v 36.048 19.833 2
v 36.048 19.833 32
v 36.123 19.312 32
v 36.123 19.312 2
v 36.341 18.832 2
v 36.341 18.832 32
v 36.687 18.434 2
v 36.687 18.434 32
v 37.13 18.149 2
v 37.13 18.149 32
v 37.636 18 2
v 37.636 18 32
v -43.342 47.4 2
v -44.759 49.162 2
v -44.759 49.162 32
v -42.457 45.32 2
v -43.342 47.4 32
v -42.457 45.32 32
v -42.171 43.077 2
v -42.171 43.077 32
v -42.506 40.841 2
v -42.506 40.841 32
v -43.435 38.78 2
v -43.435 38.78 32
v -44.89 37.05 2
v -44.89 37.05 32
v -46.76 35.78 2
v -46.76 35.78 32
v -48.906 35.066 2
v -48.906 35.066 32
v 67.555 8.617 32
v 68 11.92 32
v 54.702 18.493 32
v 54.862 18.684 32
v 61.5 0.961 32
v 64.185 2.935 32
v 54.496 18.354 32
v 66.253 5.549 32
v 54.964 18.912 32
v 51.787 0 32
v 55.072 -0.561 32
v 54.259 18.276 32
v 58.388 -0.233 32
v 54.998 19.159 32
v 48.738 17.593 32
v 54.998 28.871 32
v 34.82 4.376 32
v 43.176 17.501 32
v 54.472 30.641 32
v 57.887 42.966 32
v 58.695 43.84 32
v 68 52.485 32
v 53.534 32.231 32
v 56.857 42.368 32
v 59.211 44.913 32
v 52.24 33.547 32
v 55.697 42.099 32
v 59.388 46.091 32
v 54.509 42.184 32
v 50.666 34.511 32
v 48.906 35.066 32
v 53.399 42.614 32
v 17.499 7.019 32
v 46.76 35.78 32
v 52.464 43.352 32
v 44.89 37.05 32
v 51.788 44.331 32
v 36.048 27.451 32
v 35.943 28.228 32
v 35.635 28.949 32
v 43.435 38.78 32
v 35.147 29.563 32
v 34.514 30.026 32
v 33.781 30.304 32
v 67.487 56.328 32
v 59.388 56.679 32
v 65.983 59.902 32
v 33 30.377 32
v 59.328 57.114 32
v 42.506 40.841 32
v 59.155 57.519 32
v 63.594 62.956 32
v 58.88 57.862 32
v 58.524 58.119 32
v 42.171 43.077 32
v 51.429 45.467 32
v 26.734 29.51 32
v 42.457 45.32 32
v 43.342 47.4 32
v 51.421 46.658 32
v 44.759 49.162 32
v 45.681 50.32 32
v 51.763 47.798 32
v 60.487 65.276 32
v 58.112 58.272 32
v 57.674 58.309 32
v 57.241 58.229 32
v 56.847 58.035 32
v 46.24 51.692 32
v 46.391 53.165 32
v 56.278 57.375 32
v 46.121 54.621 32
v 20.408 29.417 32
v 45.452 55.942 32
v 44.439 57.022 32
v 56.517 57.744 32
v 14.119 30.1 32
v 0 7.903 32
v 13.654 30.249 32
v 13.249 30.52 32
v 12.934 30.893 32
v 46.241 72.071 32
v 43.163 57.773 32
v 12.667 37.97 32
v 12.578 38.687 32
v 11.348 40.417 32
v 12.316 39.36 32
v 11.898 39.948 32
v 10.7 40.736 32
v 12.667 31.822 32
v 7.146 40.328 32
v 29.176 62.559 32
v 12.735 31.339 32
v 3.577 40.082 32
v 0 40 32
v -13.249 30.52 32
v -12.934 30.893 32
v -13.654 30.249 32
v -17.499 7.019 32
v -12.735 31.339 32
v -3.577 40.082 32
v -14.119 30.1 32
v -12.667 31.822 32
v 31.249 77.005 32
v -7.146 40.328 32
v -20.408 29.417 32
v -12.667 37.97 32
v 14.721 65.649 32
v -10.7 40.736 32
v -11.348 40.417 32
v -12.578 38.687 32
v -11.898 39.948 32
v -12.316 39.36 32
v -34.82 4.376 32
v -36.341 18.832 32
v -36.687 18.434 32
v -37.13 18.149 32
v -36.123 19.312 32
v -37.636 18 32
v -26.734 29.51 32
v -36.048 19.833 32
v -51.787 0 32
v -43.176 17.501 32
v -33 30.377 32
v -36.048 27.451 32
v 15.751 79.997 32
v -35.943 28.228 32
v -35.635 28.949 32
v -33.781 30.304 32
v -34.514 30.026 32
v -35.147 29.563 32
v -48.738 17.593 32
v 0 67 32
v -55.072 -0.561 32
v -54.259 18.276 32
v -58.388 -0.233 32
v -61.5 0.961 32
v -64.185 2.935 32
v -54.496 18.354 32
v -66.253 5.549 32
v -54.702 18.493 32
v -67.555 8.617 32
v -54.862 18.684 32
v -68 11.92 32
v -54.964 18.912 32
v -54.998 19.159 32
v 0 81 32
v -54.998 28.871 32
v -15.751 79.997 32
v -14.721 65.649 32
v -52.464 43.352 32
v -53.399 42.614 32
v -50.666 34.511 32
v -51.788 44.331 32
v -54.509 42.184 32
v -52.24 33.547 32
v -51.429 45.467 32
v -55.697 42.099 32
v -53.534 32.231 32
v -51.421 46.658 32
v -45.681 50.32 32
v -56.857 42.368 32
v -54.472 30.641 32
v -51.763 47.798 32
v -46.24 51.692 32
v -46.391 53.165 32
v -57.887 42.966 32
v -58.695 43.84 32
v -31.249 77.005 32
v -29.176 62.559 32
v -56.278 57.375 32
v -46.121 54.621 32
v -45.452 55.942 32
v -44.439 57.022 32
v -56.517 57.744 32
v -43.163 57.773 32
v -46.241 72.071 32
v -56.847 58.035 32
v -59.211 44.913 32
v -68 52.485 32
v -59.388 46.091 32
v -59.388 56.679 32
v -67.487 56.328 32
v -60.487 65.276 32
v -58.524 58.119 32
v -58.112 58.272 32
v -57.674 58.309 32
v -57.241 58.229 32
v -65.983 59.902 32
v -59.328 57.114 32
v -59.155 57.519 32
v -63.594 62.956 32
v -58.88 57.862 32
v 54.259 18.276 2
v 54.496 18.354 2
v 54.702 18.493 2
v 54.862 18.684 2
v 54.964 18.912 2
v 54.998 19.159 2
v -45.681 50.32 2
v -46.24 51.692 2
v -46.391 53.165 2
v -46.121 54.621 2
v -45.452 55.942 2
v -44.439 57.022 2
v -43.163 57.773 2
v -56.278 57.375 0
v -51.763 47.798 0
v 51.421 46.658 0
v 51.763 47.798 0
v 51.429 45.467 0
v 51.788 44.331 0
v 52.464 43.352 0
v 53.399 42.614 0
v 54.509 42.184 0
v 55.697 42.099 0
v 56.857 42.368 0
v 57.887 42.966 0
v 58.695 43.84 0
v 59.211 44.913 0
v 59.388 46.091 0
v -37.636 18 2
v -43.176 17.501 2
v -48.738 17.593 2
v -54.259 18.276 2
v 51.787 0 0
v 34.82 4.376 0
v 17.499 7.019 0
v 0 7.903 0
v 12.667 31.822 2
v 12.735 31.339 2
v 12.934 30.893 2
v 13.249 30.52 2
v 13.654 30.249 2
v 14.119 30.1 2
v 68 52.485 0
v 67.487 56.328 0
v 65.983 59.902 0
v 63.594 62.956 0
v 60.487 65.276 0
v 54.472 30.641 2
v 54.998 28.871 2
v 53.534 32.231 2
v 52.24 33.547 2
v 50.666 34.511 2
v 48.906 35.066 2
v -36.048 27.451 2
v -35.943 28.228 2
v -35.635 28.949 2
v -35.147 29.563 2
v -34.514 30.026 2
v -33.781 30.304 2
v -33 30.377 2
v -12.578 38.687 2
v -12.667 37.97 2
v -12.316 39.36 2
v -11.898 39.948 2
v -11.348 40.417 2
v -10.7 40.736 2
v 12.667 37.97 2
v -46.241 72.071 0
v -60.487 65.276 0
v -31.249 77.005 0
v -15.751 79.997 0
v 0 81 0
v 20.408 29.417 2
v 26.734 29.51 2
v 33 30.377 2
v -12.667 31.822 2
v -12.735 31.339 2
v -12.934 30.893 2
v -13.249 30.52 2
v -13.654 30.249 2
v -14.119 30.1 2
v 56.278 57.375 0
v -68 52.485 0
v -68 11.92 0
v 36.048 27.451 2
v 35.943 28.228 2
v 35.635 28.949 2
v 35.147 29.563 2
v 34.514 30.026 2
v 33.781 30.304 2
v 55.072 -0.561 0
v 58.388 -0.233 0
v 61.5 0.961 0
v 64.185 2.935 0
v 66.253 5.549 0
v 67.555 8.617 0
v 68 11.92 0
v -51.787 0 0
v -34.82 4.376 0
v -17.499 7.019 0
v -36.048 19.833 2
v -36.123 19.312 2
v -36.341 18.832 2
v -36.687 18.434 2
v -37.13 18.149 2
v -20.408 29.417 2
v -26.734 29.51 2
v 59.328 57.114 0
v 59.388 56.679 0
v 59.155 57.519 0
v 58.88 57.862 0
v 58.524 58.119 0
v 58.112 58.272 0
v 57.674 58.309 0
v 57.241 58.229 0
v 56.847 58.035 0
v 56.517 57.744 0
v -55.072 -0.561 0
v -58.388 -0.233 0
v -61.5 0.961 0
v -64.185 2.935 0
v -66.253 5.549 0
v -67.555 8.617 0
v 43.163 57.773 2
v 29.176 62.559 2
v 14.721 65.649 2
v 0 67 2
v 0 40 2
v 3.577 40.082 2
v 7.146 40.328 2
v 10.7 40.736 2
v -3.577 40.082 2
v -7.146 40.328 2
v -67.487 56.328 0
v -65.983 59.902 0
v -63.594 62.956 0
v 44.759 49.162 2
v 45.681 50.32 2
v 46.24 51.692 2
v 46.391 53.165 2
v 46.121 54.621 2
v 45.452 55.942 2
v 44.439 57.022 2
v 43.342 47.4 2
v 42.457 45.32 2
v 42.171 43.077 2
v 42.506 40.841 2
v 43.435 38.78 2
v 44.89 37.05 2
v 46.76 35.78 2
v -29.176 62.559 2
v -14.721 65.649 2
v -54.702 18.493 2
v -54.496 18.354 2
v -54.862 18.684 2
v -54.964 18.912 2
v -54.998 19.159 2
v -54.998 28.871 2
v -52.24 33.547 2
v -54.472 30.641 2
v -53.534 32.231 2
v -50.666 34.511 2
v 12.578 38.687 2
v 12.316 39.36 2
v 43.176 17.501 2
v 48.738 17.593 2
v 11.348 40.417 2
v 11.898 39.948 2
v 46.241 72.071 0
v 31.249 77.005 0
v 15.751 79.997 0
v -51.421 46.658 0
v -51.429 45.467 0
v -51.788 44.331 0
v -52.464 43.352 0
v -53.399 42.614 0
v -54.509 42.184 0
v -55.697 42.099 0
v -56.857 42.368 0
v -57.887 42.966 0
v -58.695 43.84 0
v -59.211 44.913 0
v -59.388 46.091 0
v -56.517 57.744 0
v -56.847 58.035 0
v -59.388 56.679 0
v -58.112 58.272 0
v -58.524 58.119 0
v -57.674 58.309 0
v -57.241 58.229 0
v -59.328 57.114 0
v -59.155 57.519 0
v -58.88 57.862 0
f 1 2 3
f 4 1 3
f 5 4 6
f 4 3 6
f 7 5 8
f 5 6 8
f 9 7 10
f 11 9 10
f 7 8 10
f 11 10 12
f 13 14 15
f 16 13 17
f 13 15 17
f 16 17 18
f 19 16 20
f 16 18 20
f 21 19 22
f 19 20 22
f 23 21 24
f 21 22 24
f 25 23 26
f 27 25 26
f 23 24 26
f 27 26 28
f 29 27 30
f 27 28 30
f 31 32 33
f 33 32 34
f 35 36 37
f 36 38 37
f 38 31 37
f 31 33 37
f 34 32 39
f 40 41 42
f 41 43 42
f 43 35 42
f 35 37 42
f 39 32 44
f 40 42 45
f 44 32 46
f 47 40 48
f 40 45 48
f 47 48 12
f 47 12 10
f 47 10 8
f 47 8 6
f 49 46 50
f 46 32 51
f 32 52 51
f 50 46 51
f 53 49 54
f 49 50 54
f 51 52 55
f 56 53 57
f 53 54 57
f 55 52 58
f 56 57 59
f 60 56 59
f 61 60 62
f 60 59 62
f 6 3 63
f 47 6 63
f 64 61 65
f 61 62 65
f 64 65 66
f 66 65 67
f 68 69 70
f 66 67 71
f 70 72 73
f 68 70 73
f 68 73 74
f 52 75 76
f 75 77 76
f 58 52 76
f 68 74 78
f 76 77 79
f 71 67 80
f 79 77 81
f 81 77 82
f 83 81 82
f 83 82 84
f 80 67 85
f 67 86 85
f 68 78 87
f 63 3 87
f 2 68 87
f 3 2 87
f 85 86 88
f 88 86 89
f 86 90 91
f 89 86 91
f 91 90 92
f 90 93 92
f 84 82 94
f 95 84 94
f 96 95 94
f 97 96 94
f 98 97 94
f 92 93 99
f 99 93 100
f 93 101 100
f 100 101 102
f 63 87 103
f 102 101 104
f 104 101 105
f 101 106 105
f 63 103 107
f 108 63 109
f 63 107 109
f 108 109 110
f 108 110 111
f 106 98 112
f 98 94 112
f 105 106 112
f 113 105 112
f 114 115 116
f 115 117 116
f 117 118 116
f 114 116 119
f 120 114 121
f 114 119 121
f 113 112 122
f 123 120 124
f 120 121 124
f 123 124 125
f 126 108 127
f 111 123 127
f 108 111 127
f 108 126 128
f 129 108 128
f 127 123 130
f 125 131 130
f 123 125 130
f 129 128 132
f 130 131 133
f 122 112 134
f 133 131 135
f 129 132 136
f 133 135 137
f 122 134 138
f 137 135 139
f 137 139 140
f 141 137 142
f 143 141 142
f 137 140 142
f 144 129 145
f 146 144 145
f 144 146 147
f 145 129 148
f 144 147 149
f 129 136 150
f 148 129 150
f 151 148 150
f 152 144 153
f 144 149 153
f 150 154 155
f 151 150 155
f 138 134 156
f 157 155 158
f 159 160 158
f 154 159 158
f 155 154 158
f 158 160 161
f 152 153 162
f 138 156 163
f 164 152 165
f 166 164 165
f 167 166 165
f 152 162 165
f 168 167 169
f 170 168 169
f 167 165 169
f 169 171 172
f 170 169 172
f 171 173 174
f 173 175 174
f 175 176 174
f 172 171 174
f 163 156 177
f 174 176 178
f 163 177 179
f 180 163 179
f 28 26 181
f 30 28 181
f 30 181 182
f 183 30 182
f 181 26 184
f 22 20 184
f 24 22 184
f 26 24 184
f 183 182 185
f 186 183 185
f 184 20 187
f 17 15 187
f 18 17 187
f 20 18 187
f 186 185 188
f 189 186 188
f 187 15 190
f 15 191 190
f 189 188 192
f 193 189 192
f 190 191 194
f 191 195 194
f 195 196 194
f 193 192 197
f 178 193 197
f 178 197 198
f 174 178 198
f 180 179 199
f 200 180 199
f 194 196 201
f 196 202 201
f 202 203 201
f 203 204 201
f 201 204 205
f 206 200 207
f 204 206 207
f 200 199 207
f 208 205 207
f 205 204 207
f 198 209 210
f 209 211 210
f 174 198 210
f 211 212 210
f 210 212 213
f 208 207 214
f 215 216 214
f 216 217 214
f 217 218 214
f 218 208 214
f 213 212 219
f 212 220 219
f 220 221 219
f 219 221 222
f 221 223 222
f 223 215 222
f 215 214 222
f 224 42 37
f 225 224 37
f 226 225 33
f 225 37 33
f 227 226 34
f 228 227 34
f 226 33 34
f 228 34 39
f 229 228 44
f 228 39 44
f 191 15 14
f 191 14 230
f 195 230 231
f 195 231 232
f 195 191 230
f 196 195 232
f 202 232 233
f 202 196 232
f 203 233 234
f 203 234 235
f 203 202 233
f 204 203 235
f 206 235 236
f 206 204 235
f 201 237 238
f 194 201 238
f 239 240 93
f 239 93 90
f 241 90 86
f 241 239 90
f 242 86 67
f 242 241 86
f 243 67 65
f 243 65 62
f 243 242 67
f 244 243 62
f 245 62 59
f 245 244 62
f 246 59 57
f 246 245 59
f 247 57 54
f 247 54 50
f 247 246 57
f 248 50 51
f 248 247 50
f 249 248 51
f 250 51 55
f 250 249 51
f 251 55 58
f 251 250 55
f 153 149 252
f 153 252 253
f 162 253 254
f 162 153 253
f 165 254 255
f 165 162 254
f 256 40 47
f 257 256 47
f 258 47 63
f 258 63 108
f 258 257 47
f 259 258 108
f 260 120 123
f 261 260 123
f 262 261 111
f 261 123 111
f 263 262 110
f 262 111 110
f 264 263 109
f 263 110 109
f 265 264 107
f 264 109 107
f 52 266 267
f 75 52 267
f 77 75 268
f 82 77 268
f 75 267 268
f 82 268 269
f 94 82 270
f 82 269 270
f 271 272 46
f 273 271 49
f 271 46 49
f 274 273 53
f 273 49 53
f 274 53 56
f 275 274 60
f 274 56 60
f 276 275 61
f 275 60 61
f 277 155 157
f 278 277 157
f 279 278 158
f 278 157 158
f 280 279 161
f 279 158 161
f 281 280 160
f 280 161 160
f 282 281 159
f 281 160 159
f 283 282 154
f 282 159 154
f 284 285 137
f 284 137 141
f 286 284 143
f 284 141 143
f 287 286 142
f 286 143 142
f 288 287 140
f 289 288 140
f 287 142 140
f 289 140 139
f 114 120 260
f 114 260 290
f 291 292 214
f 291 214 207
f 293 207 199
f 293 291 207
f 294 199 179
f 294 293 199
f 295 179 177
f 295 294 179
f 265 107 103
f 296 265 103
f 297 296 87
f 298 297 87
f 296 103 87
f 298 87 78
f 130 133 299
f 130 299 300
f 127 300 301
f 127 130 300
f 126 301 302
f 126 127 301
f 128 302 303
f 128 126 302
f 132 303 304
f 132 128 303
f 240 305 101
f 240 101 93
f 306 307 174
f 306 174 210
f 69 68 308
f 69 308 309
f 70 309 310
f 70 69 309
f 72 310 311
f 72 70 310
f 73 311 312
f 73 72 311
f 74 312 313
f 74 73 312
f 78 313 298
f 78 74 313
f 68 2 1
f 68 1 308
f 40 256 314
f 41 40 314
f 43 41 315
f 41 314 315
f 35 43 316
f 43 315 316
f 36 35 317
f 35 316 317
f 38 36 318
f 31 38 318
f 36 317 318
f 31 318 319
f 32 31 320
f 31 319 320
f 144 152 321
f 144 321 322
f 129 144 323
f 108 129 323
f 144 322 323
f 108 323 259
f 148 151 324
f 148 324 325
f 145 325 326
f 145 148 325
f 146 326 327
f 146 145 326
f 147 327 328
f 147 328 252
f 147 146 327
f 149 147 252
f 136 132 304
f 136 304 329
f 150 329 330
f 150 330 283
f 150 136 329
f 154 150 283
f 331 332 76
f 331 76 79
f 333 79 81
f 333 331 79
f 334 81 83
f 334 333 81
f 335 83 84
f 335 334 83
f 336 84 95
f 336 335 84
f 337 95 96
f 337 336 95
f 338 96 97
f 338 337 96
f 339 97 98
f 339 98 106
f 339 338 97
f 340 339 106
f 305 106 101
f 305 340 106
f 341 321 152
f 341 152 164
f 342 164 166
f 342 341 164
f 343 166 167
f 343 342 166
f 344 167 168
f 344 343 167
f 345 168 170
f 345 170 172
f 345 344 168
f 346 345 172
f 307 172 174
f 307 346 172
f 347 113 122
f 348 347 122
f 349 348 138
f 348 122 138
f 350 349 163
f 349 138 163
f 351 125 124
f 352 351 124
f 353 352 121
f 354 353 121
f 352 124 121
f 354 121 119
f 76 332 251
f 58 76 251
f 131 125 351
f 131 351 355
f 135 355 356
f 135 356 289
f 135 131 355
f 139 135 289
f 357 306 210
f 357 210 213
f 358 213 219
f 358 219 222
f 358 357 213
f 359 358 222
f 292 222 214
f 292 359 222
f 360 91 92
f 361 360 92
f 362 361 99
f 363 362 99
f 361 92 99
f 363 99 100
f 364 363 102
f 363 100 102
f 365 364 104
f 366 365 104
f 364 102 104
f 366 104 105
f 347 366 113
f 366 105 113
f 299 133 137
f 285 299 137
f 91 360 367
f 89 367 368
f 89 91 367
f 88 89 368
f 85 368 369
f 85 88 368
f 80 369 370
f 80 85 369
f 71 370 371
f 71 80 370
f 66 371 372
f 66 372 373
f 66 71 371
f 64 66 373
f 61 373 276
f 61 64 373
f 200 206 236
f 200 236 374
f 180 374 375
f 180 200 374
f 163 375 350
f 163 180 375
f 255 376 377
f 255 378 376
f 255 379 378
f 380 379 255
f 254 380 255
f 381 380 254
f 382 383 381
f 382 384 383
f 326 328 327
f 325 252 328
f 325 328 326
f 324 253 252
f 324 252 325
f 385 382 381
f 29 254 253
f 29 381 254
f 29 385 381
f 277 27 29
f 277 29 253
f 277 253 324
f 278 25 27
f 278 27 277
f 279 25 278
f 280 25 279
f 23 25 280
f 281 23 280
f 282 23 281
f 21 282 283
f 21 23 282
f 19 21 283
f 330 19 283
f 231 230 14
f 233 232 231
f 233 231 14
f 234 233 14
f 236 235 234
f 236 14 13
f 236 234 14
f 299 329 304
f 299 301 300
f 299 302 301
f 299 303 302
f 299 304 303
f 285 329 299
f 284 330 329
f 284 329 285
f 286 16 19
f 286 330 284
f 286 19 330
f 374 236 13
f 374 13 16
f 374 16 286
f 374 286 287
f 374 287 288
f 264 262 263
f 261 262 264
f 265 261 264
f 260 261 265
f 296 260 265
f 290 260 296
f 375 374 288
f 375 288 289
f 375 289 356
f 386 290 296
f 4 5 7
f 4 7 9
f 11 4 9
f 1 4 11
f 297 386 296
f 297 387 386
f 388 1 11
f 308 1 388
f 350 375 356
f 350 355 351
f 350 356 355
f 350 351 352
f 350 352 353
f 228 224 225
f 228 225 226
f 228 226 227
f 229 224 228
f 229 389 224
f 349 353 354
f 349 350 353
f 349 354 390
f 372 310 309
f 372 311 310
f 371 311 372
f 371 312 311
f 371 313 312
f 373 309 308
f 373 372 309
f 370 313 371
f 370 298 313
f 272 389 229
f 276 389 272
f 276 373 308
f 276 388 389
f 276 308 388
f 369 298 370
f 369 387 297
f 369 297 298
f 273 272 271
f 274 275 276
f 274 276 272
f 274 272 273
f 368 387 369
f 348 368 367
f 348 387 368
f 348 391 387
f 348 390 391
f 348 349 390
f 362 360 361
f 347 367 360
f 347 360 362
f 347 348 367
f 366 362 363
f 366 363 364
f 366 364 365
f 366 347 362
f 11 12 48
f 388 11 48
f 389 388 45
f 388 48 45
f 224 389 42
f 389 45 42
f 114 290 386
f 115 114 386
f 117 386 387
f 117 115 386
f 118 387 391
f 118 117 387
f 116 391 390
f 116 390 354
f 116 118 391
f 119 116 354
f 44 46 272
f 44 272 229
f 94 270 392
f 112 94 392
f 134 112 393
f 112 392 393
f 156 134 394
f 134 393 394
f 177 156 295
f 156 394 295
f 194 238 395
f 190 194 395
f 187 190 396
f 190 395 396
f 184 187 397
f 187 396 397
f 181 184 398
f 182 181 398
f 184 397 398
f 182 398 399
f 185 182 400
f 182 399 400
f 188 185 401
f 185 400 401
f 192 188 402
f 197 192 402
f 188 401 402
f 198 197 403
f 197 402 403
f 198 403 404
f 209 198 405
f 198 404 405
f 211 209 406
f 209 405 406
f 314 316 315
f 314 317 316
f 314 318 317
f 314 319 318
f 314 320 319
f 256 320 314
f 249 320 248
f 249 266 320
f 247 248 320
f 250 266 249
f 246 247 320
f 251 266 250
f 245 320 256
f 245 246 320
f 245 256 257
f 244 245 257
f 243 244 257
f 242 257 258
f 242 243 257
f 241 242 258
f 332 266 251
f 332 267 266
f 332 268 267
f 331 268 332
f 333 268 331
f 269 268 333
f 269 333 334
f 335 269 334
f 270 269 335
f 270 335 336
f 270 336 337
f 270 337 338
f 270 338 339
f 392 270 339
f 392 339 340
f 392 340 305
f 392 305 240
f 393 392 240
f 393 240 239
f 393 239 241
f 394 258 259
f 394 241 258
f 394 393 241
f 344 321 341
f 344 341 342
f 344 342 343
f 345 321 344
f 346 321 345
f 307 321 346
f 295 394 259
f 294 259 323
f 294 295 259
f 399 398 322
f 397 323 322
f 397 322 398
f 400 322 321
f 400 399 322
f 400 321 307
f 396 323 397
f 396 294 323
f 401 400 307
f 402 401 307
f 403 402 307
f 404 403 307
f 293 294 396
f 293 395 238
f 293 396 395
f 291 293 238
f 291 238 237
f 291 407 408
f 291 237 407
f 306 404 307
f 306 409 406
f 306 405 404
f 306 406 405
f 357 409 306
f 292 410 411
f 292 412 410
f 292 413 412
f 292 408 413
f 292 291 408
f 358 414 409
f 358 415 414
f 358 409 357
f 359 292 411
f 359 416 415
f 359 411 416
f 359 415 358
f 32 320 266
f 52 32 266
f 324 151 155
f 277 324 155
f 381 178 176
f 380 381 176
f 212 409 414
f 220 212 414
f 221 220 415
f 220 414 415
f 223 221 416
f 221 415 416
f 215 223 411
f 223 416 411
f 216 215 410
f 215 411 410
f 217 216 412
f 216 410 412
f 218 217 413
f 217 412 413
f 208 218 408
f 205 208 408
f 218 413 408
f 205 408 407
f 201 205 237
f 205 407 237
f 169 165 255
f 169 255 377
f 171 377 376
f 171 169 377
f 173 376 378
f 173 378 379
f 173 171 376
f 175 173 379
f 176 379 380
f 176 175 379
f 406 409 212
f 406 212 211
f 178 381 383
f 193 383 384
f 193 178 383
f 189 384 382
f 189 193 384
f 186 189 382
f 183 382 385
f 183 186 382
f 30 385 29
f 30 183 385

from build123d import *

# Parameters (mm, degrees)
PAD_DEPTH    = 32
POCKET_DEPTH = 30


with BuildPart() as part:
    # Sketch → Pad (new body)
    with BuildSketch(Plane.XY):
        with BuildLine():
            Line((68, 11.919847), (68, 52.484752))
            ThreePointArc((68, 52.484752), (65.982797, 59.902078), (60.486868, 65.276144))
            ThreePointArc((60.486868, 65.276144), (31.248603, 77.004779), (0, 81))
            Line((0, 81), (0, 7.903371))
            ThreePointArc((51.786627, 0), (26.193119, 5.916155), (0, 7.903371))
            ThreePointArc((51.786627, 0), (62.908928, 1.858085), (68, 11.919847))
        make_face()
        with BuildLine():
            Line((56.278101, 57.375088), (51.762611, 47.798227))
            ThreePointArc((51.762611, 47.798227), (54.509093, 42.183801), (59.387684, 46.090756))
            Line((59.387684, 56.678764), (59.387684, 46.090756))
            ThreePointArc((59.387684, 56.678764), (58.111713, 58.27206), (56.278101, 57.375088))
        make_face(mode=Mode.SUBTRACT)
    pad = extrude(amount=PAD_DEPTH)

    # Sketch001 → Pocket (cut)
    with BuildSketch(Plane.XY.offset(32)):
        with BuildLine():
            ThreePointArc((43.162552, 57.77313), (21.99443, 64.319264), (0, 67))
            Line((0, 67), (0, 40))
            ThreePointArc((0, 40), (5.362658, 40.184337), (10.7, 40.736478))
            ThreePointArc((12.666923, 37.969749), (12.125079, 39.667069), (10.7, 40.736478))
            Line((12.666923, 31.822003), (12.666923, 37.969749))
            ThreePointArc((12.666923, 31.822003), (13.078436, 30.695708), (14.119116, 30.1))
            ThreePointArc((14.119116, 30.1), (23.572379, 29.366387), (33, 30.377498))
            ThreePointArc((36.047549, 27.450542), (35.147342, 29.563278), (33, 30.377498))
            Line((36.047549, 19.83336), (36.047549, 27.450542))
            ThreePointArc((36.047549, 19.83336), (36.499771, 18.620595), (37.635625, 18))
            ThreePointArc((37.635625, 18), (45.958329, 17.472818), (54.258916, 18.276295))
            ThreePointArc((54.258916, 18.276295), (54.788961, 18.583293), (54.998194, 19.158982))
            Line((54.998194, 28.871338), (54.998194, 19.158982))
            ThreePointArc((54.998194, 28.871338), (52.927452, 32.928287), (48.905587, 35.066376))
            ThreePointArc((44.75866, 49.161724), (42.505536, 40.841145), (48.905587, 35.066376))
            ThreePointArc((44.75866, 49.161724), (46.308059, 53.902523), (43.162552, 57.77313))
        make_face()
    pocket = extrude(amount=-POCKET_DEPTH, mode=Mode.SUBTRACT)

    # Mirrored: Pad, Pocket across Sketch001 V_Axis
    add(pad.mirror(Plane(origin=(0, 0, 32), x_dir=(0, 0, 1), z_dir=(1, 0, 0))))
    add(pocket.mirror(Plane(origin=(0, 0, 32), x_dir=(0, 0, 1), z_dir=(1, 0, 0))), mode=Mode.SUBTRACT)


solid = part.part
